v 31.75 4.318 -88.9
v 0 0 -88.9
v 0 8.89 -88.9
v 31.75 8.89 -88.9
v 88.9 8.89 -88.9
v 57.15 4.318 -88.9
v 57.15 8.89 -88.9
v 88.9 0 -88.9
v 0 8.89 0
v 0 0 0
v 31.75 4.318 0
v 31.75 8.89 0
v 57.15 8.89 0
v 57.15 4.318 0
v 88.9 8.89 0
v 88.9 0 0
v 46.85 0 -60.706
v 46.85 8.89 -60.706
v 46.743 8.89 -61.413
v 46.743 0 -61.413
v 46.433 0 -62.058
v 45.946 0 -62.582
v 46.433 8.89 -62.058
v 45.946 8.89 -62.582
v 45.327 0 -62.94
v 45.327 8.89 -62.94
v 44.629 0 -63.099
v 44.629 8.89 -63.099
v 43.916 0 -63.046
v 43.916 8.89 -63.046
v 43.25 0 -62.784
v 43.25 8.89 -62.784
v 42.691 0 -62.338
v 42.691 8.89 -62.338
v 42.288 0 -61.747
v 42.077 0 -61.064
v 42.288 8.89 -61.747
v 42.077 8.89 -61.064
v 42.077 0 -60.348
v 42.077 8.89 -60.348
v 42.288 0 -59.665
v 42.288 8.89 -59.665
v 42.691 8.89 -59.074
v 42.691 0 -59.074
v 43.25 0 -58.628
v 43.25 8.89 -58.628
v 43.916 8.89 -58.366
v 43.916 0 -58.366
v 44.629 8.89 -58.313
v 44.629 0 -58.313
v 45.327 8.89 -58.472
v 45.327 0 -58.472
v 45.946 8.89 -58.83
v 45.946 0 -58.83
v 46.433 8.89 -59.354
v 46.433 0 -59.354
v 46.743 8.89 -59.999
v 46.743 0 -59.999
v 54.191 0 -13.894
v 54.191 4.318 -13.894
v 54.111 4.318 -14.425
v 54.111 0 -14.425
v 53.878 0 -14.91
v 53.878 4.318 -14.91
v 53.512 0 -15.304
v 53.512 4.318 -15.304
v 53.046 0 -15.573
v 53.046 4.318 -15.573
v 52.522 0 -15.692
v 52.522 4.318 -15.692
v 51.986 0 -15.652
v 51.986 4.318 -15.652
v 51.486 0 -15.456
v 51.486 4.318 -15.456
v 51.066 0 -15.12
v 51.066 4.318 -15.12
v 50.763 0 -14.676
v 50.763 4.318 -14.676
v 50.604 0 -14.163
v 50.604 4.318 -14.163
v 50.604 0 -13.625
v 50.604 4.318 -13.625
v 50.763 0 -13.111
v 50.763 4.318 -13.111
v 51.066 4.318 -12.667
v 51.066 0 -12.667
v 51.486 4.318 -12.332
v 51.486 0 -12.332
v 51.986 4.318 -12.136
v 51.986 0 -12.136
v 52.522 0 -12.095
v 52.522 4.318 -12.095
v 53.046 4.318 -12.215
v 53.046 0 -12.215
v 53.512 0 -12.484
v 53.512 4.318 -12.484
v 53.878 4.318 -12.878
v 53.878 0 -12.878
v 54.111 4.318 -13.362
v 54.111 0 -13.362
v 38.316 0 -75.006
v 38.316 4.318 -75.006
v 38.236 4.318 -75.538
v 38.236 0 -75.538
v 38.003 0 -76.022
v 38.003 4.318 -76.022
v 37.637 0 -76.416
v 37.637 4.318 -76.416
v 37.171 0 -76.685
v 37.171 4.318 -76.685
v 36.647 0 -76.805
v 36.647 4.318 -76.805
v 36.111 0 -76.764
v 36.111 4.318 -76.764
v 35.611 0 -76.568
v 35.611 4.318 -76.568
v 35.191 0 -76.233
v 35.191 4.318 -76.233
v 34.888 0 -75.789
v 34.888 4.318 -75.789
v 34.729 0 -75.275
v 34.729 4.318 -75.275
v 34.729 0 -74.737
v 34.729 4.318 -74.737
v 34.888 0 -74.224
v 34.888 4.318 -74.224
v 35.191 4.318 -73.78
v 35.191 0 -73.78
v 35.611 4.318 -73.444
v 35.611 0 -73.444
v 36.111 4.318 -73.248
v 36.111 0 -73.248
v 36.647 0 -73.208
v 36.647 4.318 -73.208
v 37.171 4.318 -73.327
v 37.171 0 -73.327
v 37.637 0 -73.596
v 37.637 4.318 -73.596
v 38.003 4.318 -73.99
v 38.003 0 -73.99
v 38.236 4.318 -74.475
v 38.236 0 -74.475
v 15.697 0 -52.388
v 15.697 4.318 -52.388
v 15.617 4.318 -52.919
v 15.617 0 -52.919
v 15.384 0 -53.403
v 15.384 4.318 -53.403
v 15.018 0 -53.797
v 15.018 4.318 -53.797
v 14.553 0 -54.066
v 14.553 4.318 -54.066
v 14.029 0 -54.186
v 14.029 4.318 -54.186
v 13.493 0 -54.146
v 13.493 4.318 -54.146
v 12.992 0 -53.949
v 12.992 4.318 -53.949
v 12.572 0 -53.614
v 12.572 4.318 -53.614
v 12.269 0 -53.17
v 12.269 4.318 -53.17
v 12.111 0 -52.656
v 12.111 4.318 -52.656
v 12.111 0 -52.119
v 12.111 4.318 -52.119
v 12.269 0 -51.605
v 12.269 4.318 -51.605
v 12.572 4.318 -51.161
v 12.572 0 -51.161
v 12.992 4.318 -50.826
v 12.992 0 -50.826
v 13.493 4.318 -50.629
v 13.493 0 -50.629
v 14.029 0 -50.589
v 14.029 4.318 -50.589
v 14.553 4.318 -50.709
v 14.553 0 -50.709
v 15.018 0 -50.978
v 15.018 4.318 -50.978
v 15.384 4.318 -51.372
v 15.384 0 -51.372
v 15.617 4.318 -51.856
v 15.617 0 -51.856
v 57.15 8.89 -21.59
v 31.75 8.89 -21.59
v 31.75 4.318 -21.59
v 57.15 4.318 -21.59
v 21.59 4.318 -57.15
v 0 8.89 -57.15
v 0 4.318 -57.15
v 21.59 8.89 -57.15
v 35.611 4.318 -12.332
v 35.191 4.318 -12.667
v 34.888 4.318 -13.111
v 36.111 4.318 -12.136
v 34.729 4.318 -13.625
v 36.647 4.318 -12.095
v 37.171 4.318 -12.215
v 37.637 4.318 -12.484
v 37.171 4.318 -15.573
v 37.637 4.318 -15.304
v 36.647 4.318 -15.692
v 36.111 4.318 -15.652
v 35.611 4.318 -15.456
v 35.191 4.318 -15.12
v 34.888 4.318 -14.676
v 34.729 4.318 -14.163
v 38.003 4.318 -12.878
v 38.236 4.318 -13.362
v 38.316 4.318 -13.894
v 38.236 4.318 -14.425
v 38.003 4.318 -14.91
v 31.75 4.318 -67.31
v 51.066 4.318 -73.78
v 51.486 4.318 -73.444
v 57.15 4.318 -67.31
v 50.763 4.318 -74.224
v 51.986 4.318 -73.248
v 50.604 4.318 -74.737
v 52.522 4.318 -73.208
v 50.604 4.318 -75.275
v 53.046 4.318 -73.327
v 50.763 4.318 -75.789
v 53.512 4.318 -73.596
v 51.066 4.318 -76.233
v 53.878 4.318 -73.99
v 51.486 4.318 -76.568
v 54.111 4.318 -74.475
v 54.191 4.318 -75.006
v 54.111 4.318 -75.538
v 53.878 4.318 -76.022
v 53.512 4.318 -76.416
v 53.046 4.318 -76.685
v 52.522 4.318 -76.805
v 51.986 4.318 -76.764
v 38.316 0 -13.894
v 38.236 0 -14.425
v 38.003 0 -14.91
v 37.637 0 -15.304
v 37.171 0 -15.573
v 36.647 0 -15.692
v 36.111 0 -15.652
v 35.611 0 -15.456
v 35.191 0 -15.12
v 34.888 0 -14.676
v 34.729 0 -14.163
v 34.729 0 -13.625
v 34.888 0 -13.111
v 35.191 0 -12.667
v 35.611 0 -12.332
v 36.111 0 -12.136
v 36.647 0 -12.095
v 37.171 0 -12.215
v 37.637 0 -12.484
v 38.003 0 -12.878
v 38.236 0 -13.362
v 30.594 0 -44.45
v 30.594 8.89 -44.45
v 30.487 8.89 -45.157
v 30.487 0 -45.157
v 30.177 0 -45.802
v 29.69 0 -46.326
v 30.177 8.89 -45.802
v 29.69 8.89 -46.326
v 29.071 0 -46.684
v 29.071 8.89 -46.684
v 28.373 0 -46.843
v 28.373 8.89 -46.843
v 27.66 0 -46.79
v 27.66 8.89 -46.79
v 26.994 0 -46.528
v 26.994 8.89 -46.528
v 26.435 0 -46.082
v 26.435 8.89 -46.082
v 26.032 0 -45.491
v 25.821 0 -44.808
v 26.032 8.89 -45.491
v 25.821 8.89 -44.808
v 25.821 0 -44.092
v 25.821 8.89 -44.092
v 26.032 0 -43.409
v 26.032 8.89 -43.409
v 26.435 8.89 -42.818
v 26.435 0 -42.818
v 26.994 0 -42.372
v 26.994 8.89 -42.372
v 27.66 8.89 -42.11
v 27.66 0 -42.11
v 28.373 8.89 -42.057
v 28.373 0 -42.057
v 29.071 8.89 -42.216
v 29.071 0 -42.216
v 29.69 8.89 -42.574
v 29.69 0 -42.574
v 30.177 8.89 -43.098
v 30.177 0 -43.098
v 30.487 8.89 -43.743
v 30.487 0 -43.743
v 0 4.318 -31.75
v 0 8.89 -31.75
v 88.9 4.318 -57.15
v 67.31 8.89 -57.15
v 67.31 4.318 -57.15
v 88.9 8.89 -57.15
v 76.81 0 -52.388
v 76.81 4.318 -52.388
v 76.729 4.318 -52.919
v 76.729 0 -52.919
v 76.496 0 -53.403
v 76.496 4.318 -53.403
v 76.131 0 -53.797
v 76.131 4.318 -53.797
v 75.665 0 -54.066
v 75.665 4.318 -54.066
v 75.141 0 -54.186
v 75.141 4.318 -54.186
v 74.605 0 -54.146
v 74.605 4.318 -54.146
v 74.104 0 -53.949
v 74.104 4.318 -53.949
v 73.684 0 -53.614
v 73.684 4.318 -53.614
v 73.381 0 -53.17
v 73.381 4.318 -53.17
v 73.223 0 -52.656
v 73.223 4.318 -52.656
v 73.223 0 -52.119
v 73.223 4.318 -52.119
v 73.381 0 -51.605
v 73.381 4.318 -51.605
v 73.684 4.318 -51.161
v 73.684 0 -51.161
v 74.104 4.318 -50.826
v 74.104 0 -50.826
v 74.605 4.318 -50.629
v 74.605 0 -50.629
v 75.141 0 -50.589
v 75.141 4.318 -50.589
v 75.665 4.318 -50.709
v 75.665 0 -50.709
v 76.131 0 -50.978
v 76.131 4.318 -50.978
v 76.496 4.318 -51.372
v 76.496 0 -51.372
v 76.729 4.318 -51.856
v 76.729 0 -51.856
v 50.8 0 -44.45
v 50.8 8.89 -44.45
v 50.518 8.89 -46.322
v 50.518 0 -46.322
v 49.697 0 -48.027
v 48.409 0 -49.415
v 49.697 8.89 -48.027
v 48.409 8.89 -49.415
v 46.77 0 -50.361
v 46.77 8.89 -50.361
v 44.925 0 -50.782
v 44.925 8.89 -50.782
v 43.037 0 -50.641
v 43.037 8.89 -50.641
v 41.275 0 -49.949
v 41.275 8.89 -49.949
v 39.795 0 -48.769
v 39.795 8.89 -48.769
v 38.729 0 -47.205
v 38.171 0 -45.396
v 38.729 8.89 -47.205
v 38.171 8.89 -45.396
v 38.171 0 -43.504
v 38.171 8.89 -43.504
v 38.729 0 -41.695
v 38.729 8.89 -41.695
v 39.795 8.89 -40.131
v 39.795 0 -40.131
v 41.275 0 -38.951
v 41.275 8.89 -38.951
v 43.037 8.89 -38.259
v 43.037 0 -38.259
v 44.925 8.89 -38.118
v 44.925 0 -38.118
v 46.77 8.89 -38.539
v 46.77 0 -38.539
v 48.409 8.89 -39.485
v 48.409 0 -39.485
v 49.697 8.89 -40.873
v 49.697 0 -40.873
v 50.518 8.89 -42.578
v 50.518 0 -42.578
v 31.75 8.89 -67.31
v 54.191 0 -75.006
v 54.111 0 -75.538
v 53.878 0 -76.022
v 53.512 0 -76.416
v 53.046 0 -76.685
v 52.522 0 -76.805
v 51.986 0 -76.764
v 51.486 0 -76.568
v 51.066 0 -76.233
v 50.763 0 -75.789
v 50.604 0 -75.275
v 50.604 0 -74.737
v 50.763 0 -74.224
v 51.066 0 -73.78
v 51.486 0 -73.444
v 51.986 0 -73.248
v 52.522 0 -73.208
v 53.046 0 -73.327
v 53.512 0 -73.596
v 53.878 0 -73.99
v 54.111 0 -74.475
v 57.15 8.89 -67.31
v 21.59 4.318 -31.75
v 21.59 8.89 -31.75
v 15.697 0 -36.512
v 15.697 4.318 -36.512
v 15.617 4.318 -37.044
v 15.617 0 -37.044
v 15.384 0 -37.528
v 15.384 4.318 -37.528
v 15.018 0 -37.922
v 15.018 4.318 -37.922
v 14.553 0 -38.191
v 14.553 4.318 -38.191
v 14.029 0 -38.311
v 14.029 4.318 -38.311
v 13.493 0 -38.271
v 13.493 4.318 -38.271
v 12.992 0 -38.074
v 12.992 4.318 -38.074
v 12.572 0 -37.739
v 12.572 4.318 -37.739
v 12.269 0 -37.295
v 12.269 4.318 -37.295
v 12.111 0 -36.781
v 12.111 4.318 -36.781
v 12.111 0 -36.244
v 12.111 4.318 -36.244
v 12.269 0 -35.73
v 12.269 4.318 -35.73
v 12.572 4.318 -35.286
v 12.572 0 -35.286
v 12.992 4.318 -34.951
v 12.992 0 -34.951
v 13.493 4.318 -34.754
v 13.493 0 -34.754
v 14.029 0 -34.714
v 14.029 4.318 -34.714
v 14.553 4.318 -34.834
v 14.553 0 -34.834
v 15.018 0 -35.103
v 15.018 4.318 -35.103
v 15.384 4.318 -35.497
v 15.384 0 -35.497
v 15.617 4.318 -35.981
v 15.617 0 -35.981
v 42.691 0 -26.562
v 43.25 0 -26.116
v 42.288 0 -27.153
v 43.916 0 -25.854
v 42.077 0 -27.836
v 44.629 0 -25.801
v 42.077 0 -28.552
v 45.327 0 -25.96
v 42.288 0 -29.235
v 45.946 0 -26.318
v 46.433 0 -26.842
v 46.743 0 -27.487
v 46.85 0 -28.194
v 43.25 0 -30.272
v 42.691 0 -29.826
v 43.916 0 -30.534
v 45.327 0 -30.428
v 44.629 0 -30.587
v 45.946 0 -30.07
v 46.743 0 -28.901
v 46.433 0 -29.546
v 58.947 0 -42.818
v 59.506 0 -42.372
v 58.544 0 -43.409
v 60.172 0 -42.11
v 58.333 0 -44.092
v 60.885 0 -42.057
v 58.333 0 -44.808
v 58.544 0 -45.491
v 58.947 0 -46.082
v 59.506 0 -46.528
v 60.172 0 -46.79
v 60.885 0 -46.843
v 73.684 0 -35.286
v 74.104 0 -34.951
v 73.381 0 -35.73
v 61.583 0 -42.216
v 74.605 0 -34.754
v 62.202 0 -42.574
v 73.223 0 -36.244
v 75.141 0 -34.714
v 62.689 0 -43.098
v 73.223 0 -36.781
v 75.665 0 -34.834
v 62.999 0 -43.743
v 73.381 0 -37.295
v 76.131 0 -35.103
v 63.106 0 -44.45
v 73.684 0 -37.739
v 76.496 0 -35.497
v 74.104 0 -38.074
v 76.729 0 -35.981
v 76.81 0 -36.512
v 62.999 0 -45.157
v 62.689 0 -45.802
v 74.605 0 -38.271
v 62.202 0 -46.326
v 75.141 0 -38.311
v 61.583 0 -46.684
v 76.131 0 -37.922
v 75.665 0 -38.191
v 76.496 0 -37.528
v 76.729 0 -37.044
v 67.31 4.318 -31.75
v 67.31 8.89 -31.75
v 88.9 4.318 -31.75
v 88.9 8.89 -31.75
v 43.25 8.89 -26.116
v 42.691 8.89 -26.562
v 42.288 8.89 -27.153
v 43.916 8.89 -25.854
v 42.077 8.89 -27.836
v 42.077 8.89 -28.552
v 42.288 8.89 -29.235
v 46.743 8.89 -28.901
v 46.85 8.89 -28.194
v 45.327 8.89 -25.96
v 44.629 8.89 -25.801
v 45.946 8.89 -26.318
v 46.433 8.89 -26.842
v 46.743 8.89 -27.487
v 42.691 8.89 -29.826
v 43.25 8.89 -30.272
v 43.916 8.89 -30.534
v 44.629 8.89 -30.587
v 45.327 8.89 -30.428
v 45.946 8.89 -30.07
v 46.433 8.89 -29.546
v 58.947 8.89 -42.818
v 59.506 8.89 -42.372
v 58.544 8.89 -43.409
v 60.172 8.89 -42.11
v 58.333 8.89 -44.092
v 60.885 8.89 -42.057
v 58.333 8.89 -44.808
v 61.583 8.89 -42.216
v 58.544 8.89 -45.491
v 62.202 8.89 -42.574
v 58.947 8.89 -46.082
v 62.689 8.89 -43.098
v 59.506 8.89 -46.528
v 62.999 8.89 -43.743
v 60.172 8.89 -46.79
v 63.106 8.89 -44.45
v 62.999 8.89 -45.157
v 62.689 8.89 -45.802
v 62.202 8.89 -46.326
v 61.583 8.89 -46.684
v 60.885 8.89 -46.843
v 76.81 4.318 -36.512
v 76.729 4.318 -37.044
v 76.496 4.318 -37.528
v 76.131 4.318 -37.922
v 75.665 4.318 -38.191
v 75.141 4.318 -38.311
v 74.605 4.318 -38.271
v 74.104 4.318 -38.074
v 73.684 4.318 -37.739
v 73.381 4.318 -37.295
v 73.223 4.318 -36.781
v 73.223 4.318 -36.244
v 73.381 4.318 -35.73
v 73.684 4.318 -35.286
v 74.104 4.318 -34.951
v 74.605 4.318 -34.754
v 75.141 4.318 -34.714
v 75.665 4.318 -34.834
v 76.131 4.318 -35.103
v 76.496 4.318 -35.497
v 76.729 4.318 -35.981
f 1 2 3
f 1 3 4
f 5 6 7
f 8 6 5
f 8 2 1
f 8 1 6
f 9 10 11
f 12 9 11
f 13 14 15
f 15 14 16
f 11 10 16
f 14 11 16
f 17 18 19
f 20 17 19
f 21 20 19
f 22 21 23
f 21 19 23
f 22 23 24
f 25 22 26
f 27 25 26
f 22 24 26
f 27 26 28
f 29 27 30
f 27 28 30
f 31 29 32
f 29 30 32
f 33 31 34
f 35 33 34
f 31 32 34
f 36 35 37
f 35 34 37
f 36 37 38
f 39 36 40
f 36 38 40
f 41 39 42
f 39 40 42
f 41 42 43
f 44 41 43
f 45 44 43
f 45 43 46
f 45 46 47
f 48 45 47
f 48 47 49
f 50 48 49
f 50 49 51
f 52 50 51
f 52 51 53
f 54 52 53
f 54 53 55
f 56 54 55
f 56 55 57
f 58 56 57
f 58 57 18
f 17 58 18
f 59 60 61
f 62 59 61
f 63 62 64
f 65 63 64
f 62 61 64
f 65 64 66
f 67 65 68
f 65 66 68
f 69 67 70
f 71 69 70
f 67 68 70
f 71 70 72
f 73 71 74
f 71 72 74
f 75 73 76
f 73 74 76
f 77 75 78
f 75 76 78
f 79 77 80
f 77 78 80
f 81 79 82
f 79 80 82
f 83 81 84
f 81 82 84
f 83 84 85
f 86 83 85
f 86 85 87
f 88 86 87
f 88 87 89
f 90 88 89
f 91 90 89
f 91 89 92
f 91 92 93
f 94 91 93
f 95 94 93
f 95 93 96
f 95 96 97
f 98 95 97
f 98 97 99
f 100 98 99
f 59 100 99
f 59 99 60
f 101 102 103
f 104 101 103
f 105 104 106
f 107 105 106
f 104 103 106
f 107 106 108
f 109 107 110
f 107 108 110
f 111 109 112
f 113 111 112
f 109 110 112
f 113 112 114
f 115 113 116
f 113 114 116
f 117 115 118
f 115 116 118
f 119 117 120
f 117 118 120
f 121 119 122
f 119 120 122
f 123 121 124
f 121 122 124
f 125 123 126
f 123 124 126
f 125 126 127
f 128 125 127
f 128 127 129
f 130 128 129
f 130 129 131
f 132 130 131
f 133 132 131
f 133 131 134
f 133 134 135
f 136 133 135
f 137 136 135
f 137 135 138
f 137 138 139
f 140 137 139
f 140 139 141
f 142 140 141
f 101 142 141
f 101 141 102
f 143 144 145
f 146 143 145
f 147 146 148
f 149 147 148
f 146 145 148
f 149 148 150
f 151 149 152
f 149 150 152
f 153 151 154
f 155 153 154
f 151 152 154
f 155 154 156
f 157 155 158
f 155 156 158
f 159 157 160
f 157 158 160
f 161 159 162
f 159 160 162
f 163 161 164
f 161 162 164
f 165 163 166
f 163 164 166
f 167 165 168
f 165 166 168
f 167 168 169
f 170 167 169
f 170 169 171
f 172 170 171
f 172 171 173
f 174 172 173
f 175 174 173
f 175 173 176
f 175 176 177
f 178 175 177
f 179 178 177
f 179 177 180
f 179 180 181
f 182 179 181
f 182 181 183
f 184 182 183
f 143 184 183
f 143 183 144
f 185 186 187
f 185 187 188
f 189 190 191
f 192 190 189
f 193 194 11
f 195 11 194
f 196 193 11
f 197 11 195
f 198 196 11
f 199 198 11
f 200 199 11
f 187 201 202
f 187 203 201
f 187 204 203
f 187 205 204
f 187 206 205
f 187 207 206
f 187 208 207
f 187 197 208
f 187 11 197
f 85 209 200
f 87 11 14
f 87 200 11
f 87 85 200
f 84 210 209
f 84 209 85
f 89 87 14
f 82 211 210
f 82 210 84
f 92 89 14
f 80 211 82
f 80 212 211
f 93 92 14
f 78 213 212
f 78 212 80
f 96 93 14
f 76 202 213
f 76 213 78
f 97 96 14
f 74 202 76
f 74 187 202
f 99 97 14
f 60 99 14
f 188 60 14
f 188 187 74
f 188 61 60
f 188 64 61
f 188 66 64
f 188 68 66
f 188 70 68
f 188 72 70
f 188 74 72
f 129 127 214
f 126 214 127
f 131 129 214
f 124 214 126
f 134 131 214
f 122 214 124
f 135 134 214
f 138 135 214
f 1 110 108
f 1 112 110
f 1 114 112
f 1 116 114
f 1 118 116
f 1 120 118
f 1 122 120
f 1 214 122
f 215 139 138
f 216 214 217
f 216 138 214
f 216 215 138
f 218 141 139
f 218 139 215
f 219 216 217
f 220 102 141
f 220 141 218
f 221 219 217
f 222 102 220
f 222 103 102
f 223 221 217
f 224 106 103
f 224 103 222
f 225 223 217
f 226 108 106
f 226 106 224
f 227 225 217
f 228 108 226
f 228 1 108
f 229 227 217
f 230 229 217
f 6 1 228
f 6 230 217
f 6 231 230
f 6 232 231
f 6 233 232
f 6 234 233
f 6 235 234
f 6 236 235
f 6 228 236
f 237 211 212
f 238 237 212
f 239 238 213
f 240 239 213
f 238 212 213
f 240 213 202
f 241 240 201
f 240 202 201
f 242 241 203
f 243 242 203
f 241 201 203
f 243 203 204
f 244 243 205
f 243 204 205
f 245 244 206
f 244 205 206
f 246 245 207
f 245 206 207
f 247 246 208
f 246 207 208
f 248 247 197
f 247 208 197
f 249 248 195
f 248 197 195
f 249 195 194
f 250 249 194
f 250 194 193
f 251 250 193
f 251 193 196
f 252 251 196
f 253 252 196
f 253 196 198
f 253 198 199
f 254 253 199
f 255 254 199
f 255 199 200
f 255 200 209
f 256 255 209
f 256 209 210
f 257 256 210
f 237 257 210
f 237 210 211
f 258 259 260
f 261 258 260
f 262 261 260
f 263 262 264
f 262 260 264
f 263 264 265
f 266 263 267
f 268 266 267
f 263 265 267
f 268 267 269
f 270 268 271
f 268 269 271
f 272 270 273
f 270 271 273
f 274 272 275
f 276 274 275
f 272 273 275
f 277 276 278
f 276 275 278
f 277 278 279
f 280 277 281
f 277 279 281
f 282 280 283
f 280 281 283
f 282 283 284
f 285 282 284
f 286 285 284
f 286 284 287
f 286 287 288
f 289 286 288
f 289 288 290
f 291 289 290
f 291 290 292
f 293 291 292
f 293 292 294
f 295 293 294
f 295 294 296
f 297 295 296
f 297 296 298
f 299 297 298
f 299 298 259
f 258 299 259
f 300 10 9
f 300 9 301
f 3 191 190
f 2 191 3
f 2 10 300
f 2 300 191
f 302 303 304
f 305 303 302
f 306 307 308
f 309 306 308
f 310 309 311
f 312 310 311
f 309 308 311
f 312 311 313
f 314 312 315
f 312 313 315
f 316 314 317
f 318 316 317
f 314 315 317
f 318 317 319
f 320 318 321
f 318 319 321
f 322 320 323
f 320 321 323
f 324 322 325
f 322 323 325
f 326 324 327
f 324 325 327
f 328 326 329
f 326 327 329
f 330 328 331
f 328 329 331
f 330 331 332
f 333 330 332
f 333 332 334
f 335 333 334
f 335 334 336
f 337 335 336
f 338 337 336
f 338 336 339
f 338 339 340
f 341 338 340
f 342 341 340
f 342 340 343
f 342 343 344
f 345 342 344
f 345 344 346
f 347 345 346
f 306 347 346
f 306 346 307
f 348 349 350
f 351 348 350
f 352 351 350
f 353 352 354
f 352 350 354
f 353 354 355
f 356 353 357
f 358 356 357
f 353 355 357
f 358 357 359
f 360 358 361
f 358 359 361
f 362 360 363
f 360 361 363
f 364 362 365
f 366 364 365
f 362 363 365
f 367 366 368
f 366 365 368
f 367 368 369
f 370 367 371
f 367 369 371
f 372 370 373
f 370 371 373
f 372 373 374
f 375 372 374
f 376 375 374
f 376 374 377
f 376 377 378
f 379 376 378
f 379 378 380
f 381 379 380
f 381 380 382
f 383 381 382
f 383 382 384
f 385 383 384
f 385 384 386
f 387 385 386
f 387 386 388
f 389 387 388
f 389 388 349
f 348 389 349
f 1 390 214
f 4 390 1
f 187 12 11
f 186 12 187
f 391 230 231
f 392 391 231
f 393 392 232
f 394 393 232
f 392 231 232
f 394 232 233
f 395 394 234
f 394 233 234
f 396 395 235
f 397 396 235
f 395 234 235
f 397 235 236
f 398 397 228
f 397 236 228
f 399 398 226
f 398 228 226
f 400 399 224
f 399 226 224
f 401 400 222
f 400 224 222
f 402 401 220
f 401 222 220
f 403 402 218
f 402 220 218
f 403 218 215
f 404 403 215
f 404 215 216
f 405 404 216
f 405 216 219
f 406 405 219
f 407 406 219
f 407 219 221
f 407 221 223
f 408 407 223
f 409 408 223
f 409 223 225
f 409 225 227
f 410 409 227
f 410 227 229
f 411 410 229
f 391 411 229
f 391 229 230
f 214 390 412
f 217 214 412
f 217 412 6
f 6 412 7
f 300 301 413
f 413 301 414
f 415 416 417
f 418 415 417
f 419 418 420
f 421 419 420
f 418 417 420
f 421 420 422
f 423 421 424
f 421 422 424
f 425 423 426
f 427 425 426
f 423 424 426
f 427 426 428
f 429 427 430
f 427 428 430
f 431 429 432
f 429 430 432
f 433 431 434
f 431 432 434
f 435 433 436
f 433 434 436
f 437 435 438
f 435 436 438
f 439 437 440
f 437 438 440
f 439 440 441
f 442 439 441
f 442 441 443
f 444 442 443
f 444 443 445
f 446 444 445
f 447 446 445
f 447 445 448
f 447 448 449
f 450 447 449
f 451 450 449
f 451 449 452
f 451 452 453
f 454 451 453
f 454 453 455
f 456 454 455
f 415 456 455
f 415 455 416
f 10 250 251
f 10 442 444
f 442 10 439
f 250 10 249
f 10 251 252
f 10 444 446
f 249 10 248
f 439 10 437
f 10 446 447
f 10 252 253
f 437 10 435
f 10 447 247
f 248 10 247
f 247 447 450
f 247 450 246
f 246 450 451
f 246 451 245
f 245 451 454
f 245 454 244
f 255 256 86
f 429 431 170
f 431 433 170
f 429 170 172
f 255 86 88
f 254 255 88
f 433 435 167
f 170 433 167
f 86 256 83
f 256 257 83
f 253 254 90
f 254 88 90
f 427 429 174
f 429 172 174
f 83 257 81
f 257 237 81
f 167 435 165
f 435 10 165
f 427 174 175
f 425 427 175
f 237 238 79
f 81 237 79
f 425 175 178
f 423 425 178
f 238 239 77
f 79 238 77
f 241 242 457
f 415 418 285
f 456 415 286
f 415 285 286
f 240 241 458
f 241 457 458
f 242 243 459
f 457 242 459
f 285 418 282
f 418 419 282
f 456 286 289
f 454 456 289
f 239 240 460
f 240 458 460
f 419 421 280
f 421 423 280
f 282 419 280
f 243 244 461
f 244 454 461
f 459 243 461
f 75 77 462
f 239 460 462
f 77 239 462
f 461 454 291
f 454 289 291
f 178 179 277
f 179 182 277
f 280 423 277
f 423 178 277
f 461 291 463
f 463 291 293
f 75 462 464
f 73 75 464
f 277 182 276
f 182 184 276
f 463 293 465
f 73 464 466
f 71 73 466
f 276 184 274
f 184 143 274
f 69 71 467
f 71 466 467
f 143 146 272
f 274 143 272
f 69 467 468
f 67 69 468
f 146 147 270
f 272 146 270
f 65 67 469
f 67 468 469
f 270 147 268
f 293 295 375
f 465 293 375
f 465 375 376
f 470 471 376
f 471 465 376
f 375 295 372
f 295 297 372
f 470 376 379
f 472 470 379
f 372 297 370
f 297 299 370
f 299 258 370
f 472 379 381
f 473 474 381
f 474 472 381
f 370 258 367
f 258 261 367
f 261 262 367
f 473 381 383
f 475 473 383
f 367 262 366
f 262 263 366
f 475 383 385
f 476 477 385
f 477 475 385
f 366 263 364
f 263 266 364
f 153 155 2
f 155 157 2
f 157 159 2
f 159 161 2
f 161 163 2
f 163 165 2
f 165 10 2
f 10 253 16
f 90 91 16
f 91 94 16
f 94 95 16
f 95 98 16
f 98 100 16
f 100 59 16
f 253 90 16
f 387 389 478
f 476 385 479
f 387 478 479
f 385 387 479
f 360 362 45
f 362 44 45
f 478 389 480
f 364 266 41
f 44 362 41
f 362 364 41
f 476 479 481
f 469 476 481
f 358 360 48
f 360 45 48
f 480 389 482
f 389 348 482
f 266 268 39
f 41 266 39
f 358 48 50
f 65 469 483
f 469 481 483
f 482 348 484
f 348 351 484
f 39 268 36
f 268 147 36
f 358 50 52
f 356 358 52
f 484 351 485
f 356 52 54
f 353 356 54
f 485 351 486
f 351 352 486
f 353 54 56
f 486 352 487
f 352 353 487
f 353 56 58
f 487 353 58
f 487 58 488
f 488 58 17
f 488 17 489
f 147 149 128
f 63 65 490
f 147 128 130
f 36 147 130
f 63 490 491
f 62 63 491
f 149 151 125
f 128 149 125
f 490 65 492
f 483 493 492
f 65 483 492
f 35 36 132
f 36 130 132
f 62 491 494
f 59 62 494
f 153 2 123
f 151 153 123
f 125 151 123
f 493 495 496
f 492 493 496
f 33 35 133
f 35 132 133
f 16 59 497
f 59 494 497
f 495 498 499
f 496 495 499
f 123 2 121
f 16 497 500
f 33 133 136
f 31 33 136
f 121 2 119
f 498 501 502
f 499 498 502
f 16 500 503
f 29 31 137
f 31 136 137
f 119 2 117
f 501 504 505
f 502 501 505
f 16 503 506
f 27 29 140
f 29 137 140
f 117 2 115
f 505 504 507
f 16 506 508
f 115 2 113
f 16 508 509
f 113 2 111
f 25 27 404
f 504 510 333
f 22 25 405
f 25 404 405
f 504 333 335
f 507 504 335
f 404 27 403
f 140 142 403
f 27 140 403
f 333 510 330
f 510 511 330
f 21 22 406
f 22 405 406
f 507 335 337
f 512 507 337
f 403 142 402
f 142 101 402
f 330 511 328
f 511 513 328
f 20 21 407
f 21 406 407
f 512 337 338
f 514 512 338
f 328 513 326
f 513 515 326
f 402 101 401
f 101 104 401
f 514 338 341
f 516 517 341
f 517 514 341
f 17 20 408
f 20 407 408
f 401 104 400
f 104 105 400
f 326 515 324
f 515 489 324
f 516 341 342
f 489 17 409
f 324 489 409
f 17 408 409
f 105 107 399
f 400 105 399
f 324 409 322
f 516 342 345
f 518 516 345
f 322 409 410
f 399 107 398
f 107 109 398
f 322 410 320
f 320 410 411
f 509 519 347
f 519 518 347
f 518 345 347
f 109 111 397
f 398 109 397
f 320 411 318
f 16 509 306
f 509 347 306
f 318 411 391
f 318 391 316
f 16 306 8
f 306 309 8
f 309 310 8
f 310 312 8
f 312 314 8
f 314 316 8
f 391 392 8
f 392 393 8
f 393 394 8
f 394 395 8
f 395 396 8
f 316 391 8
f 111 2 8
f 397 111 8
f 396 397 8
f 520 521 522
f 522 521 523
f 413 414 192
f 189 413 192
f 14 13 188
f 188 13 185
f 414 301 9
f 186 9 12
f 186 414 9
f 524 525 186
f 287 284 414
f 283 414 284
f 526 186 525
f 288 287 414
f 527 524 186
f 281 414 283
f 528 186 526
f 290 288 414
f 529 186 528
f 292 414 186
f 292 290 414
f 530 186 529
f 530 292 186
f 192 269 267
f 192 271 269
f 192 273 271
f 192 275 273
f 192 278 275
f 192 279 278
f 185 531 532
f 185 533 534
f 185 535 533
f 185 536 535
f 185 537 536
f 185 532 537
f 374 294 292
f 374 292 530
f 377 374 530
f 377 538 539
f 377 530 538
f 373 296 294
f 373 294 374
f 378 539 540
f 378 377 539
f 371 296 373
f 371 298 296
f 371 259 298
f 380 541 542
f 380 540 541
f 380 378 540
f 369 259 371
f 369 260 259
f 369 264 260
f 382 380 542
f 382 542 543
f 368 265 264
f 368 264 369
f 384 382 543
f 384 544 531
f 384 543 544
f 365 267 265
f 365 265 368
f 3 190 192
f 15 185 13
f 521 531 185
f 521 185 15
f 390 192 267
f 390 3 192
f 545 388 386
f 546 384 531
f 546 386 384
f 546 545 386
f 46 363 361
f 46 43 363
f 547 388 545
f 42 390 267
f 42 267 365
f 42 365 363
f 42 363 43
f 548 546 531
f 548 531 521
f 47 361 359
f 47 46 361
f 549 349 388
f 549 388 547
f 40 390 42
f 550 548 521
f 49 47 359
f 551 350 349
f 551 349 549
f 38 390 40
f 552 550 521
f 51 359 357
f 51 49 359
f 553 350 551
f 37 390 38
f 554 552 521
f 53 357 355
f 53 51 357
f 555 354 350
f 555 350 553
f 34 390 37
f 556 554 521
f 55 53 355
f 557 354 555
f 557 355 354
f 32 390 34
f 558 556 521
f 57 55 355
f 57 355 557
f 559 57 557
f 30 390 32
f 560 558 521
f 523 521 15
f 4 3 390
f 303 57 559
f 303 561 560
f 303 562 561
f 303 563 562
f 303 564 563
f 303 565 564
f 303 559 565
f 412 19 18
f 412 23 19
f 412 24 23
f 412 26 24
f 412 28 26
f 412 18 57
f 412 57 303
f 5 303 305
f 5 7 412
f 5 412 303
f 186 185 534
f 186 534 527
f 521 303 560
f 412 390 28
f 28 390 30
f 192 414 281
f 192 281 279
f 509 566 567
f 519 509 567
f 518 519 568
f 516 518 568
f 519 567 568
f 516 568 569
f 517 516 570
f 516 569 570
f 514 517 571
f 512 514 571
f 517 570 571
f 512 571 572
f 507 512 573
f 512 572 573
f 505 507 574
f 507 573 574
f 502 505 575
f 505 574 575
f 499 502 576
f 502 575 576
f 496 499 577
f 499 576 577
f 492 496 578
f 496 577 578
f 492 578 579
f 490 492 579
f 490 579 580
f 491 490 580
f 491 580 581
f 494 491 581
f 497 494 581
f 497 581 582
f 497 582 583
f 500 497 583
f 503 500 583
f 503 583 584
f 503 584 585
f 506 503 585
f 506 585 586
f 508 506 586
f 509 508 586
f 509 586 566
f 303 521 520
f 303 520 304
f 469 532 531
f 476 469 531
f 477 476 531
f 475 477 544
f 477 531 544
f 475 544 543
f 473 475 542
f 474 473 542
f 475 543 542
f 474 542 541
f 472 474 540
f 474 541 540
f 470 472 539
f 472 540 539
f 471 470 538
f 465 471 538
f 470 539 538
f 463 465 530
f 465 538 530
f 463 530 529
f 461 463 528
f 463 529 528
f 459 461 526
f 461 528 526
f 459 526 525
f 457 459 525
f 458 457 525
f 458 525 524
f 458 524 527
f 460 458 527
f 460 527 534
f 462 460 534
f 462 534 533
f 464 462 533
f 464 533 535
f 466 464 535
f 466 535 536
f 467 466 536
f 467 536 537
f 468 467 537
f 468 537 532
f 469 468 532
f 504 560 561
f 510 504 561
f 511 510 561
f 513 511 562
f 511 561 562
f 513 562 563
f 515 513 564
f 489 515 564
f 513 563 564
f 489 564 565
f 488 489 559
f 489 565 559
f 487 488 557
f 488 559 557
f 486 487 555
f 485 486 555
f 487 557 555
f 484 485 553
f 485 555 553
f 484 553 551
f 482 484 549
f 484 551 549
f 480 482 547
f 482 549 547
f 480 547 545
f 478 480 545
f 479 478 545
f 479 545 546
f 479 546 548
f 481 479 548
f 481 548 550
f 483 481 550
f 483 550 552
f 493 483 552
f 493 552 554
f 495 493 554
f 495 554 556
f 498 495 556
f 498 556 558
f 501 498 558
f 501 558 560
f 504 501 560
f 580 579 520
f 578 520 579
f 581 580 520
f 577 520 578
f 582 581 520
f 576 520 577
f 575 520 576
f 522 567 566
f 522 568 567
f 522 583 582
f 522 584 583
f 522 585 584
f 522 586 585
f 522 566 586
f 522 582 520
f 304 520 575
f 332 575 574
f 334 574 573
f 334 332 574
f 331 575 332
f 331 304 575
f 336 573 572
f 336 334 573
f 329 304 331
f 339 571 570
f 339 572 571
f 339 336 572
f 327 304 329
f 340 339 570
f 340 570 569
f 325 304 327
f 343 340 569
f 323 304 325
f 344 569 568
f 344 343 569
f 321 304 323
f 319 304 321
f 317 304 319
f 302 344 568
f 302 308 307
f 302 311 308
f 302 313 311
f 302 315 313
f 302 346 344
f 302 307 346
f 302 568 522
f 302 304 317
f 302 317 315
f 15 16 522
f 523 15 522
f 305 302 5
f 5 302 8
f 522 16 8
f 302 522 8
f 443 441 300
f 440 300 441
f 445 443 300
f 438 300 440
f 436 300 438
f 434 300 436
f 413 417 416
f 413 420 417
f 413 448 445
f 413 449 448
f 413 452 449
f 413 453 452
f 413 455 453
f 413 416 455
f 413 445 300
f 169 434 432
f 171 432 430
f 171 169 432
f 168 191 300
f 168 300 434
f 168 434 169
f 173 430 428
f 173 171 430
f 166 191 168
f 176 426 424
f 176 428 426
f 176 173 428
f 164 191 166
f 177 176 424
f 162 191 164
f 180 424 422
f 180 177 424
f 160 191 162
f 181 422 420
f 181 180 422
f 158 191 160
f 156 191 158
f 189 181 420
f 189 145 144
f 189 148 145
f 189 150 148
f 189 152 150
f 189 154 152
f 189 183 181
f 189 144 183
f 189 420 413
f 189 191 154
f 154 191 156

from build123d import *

# Parameters (mm, degrees)
SKETCH1_W           = 88.9
SKETCH1_H           = 88.9
BOSS_EXTRUDE1_DEPTH = 8.89
SKETCH2_W           = 25.4
SKETCH2_H           = 21.59
SKETCH2_W_2         = 21.59
SKETCH2_H_2         = 25.4
CUT_EXTRUDE1_DEPTH  = 4.572
SKETCH3_R           = 2.400000026
CUT_EXTRUDE2_DEPTH  = 9.89
SKETCH4_R           = 1.8034
CUT_EXTRUDE3_DEPTH  = 5.318
SKETCH5_R           = 6.35
CUT_EXTRUDE4_DEPTH  = 9.89


with BuildPart() as part:
    # Sketch1 → Boss-Extrude1 (new body)
    with BuildSketch(Plane(origin=(0, 0, 0), x_dir=(1, 0, 0), z_dir=(0, 1, 0))):
        with Locations((44.45, 44.45)):
            Rectangle(SKETCH1_W, SKETCH1_H)
    extrude(amount=BOSS_EXTRUDE1_DEPTH)

    # Sketch2 → Cut-Extrude1 (cut)
    with BuildSketch(Plane(origin=(0, 8.89, 0), x_dir=(1, 0, 0), z_dir=(0, 1, 0))):
        with Locations((44.45, 78.105)):
            Rectangle(SKETCH2_W, SKETCH2_H)
        with Locations((10.795, 44.45)):
            Rectangle(SKETCH2_W_2, SKETCH2_H_2)
        with Locations((44.45, 10.795)):
            Rectangle(SKETCH2_W, SKETCH2_H)
        with Locations((78.105, 44.45)):
            Rectangle(SKETCH2_W_2, SKETCH2_H_2)
    extrude(amount=-CUT_EXTRUDE1_DEPTH, mode=Mode.SUBTRACT)

    # Sketch3 → Cut-Extrude2 (cut, through all)
    with BuildSketch(Plane(origin=(0, 8.89, 0), x_dir=(1, 0, 0), z_dir=(0, 1, 0))):
        with Locations((28.194, 44.45)):
            Circle(SKETCH3_R)
        with Locations((44.45, 60.706)):
            Circle(SKETCH3_R)
        with Locations((60.706, 44.45)):
            Circle(SKETCH3_R)
        with Locations((44.45, 28.194)):
            Circle(SKETCH3_R)
    extrude(amount=-CUT_EXTRUDE2_DEPTH, mode=Mode.SUBTRACT)

    # Sketch4 → Cut-Extrude3 (cut, through all)
    with BuildSketch(Plane(origin=(0, 4.318, 0), x_dir=(1, 0, 0), z_dir=(0, 1, 0))):
        with Locations((75.0062, 52.3875)):
            Circle(SKETCH4_R)
        with Locations((75.0062, 36.5125)):
            Circle(SKETCH4_R)
        with Locations((52.3875, 75.0062)):
            Circle(SKETCH4_R)
        with Locations((36.5125, 75.0062)):
            Circle(SKETCH4_R)
        with Locations((13.8938, 52.3875)):
            Circle(SKETCH4_R)
        with Locations((13.8938, 36.5125)):
            Circle(SKETCH4_R)
        with Locations((36.5125, 13.8938)):
            Circle(SKETCH4_R)
        with Locations((52.3875, 13.8938)):
            Circle(SKETCH4_R)
    extrude(amount=-CUT_EXTRUDE3_DEPTH, mode=Mode.SUBTRACT)

    # Sketch5 → Cut-Extrude4 (cut, through all)
    with BuildSketch(Plane(origin=(0, 8.89, 0), x_dir=(1, 0, 0), z_dir=(0, 1, 0))):
        with Locations((44.45, 44.45)):
            Circle(SKETCH5_R)
    extrude(amount=-CUT_EXTRUDE4_DEPTH, mode=Mode.SUBTRACT)


solid = part.part
